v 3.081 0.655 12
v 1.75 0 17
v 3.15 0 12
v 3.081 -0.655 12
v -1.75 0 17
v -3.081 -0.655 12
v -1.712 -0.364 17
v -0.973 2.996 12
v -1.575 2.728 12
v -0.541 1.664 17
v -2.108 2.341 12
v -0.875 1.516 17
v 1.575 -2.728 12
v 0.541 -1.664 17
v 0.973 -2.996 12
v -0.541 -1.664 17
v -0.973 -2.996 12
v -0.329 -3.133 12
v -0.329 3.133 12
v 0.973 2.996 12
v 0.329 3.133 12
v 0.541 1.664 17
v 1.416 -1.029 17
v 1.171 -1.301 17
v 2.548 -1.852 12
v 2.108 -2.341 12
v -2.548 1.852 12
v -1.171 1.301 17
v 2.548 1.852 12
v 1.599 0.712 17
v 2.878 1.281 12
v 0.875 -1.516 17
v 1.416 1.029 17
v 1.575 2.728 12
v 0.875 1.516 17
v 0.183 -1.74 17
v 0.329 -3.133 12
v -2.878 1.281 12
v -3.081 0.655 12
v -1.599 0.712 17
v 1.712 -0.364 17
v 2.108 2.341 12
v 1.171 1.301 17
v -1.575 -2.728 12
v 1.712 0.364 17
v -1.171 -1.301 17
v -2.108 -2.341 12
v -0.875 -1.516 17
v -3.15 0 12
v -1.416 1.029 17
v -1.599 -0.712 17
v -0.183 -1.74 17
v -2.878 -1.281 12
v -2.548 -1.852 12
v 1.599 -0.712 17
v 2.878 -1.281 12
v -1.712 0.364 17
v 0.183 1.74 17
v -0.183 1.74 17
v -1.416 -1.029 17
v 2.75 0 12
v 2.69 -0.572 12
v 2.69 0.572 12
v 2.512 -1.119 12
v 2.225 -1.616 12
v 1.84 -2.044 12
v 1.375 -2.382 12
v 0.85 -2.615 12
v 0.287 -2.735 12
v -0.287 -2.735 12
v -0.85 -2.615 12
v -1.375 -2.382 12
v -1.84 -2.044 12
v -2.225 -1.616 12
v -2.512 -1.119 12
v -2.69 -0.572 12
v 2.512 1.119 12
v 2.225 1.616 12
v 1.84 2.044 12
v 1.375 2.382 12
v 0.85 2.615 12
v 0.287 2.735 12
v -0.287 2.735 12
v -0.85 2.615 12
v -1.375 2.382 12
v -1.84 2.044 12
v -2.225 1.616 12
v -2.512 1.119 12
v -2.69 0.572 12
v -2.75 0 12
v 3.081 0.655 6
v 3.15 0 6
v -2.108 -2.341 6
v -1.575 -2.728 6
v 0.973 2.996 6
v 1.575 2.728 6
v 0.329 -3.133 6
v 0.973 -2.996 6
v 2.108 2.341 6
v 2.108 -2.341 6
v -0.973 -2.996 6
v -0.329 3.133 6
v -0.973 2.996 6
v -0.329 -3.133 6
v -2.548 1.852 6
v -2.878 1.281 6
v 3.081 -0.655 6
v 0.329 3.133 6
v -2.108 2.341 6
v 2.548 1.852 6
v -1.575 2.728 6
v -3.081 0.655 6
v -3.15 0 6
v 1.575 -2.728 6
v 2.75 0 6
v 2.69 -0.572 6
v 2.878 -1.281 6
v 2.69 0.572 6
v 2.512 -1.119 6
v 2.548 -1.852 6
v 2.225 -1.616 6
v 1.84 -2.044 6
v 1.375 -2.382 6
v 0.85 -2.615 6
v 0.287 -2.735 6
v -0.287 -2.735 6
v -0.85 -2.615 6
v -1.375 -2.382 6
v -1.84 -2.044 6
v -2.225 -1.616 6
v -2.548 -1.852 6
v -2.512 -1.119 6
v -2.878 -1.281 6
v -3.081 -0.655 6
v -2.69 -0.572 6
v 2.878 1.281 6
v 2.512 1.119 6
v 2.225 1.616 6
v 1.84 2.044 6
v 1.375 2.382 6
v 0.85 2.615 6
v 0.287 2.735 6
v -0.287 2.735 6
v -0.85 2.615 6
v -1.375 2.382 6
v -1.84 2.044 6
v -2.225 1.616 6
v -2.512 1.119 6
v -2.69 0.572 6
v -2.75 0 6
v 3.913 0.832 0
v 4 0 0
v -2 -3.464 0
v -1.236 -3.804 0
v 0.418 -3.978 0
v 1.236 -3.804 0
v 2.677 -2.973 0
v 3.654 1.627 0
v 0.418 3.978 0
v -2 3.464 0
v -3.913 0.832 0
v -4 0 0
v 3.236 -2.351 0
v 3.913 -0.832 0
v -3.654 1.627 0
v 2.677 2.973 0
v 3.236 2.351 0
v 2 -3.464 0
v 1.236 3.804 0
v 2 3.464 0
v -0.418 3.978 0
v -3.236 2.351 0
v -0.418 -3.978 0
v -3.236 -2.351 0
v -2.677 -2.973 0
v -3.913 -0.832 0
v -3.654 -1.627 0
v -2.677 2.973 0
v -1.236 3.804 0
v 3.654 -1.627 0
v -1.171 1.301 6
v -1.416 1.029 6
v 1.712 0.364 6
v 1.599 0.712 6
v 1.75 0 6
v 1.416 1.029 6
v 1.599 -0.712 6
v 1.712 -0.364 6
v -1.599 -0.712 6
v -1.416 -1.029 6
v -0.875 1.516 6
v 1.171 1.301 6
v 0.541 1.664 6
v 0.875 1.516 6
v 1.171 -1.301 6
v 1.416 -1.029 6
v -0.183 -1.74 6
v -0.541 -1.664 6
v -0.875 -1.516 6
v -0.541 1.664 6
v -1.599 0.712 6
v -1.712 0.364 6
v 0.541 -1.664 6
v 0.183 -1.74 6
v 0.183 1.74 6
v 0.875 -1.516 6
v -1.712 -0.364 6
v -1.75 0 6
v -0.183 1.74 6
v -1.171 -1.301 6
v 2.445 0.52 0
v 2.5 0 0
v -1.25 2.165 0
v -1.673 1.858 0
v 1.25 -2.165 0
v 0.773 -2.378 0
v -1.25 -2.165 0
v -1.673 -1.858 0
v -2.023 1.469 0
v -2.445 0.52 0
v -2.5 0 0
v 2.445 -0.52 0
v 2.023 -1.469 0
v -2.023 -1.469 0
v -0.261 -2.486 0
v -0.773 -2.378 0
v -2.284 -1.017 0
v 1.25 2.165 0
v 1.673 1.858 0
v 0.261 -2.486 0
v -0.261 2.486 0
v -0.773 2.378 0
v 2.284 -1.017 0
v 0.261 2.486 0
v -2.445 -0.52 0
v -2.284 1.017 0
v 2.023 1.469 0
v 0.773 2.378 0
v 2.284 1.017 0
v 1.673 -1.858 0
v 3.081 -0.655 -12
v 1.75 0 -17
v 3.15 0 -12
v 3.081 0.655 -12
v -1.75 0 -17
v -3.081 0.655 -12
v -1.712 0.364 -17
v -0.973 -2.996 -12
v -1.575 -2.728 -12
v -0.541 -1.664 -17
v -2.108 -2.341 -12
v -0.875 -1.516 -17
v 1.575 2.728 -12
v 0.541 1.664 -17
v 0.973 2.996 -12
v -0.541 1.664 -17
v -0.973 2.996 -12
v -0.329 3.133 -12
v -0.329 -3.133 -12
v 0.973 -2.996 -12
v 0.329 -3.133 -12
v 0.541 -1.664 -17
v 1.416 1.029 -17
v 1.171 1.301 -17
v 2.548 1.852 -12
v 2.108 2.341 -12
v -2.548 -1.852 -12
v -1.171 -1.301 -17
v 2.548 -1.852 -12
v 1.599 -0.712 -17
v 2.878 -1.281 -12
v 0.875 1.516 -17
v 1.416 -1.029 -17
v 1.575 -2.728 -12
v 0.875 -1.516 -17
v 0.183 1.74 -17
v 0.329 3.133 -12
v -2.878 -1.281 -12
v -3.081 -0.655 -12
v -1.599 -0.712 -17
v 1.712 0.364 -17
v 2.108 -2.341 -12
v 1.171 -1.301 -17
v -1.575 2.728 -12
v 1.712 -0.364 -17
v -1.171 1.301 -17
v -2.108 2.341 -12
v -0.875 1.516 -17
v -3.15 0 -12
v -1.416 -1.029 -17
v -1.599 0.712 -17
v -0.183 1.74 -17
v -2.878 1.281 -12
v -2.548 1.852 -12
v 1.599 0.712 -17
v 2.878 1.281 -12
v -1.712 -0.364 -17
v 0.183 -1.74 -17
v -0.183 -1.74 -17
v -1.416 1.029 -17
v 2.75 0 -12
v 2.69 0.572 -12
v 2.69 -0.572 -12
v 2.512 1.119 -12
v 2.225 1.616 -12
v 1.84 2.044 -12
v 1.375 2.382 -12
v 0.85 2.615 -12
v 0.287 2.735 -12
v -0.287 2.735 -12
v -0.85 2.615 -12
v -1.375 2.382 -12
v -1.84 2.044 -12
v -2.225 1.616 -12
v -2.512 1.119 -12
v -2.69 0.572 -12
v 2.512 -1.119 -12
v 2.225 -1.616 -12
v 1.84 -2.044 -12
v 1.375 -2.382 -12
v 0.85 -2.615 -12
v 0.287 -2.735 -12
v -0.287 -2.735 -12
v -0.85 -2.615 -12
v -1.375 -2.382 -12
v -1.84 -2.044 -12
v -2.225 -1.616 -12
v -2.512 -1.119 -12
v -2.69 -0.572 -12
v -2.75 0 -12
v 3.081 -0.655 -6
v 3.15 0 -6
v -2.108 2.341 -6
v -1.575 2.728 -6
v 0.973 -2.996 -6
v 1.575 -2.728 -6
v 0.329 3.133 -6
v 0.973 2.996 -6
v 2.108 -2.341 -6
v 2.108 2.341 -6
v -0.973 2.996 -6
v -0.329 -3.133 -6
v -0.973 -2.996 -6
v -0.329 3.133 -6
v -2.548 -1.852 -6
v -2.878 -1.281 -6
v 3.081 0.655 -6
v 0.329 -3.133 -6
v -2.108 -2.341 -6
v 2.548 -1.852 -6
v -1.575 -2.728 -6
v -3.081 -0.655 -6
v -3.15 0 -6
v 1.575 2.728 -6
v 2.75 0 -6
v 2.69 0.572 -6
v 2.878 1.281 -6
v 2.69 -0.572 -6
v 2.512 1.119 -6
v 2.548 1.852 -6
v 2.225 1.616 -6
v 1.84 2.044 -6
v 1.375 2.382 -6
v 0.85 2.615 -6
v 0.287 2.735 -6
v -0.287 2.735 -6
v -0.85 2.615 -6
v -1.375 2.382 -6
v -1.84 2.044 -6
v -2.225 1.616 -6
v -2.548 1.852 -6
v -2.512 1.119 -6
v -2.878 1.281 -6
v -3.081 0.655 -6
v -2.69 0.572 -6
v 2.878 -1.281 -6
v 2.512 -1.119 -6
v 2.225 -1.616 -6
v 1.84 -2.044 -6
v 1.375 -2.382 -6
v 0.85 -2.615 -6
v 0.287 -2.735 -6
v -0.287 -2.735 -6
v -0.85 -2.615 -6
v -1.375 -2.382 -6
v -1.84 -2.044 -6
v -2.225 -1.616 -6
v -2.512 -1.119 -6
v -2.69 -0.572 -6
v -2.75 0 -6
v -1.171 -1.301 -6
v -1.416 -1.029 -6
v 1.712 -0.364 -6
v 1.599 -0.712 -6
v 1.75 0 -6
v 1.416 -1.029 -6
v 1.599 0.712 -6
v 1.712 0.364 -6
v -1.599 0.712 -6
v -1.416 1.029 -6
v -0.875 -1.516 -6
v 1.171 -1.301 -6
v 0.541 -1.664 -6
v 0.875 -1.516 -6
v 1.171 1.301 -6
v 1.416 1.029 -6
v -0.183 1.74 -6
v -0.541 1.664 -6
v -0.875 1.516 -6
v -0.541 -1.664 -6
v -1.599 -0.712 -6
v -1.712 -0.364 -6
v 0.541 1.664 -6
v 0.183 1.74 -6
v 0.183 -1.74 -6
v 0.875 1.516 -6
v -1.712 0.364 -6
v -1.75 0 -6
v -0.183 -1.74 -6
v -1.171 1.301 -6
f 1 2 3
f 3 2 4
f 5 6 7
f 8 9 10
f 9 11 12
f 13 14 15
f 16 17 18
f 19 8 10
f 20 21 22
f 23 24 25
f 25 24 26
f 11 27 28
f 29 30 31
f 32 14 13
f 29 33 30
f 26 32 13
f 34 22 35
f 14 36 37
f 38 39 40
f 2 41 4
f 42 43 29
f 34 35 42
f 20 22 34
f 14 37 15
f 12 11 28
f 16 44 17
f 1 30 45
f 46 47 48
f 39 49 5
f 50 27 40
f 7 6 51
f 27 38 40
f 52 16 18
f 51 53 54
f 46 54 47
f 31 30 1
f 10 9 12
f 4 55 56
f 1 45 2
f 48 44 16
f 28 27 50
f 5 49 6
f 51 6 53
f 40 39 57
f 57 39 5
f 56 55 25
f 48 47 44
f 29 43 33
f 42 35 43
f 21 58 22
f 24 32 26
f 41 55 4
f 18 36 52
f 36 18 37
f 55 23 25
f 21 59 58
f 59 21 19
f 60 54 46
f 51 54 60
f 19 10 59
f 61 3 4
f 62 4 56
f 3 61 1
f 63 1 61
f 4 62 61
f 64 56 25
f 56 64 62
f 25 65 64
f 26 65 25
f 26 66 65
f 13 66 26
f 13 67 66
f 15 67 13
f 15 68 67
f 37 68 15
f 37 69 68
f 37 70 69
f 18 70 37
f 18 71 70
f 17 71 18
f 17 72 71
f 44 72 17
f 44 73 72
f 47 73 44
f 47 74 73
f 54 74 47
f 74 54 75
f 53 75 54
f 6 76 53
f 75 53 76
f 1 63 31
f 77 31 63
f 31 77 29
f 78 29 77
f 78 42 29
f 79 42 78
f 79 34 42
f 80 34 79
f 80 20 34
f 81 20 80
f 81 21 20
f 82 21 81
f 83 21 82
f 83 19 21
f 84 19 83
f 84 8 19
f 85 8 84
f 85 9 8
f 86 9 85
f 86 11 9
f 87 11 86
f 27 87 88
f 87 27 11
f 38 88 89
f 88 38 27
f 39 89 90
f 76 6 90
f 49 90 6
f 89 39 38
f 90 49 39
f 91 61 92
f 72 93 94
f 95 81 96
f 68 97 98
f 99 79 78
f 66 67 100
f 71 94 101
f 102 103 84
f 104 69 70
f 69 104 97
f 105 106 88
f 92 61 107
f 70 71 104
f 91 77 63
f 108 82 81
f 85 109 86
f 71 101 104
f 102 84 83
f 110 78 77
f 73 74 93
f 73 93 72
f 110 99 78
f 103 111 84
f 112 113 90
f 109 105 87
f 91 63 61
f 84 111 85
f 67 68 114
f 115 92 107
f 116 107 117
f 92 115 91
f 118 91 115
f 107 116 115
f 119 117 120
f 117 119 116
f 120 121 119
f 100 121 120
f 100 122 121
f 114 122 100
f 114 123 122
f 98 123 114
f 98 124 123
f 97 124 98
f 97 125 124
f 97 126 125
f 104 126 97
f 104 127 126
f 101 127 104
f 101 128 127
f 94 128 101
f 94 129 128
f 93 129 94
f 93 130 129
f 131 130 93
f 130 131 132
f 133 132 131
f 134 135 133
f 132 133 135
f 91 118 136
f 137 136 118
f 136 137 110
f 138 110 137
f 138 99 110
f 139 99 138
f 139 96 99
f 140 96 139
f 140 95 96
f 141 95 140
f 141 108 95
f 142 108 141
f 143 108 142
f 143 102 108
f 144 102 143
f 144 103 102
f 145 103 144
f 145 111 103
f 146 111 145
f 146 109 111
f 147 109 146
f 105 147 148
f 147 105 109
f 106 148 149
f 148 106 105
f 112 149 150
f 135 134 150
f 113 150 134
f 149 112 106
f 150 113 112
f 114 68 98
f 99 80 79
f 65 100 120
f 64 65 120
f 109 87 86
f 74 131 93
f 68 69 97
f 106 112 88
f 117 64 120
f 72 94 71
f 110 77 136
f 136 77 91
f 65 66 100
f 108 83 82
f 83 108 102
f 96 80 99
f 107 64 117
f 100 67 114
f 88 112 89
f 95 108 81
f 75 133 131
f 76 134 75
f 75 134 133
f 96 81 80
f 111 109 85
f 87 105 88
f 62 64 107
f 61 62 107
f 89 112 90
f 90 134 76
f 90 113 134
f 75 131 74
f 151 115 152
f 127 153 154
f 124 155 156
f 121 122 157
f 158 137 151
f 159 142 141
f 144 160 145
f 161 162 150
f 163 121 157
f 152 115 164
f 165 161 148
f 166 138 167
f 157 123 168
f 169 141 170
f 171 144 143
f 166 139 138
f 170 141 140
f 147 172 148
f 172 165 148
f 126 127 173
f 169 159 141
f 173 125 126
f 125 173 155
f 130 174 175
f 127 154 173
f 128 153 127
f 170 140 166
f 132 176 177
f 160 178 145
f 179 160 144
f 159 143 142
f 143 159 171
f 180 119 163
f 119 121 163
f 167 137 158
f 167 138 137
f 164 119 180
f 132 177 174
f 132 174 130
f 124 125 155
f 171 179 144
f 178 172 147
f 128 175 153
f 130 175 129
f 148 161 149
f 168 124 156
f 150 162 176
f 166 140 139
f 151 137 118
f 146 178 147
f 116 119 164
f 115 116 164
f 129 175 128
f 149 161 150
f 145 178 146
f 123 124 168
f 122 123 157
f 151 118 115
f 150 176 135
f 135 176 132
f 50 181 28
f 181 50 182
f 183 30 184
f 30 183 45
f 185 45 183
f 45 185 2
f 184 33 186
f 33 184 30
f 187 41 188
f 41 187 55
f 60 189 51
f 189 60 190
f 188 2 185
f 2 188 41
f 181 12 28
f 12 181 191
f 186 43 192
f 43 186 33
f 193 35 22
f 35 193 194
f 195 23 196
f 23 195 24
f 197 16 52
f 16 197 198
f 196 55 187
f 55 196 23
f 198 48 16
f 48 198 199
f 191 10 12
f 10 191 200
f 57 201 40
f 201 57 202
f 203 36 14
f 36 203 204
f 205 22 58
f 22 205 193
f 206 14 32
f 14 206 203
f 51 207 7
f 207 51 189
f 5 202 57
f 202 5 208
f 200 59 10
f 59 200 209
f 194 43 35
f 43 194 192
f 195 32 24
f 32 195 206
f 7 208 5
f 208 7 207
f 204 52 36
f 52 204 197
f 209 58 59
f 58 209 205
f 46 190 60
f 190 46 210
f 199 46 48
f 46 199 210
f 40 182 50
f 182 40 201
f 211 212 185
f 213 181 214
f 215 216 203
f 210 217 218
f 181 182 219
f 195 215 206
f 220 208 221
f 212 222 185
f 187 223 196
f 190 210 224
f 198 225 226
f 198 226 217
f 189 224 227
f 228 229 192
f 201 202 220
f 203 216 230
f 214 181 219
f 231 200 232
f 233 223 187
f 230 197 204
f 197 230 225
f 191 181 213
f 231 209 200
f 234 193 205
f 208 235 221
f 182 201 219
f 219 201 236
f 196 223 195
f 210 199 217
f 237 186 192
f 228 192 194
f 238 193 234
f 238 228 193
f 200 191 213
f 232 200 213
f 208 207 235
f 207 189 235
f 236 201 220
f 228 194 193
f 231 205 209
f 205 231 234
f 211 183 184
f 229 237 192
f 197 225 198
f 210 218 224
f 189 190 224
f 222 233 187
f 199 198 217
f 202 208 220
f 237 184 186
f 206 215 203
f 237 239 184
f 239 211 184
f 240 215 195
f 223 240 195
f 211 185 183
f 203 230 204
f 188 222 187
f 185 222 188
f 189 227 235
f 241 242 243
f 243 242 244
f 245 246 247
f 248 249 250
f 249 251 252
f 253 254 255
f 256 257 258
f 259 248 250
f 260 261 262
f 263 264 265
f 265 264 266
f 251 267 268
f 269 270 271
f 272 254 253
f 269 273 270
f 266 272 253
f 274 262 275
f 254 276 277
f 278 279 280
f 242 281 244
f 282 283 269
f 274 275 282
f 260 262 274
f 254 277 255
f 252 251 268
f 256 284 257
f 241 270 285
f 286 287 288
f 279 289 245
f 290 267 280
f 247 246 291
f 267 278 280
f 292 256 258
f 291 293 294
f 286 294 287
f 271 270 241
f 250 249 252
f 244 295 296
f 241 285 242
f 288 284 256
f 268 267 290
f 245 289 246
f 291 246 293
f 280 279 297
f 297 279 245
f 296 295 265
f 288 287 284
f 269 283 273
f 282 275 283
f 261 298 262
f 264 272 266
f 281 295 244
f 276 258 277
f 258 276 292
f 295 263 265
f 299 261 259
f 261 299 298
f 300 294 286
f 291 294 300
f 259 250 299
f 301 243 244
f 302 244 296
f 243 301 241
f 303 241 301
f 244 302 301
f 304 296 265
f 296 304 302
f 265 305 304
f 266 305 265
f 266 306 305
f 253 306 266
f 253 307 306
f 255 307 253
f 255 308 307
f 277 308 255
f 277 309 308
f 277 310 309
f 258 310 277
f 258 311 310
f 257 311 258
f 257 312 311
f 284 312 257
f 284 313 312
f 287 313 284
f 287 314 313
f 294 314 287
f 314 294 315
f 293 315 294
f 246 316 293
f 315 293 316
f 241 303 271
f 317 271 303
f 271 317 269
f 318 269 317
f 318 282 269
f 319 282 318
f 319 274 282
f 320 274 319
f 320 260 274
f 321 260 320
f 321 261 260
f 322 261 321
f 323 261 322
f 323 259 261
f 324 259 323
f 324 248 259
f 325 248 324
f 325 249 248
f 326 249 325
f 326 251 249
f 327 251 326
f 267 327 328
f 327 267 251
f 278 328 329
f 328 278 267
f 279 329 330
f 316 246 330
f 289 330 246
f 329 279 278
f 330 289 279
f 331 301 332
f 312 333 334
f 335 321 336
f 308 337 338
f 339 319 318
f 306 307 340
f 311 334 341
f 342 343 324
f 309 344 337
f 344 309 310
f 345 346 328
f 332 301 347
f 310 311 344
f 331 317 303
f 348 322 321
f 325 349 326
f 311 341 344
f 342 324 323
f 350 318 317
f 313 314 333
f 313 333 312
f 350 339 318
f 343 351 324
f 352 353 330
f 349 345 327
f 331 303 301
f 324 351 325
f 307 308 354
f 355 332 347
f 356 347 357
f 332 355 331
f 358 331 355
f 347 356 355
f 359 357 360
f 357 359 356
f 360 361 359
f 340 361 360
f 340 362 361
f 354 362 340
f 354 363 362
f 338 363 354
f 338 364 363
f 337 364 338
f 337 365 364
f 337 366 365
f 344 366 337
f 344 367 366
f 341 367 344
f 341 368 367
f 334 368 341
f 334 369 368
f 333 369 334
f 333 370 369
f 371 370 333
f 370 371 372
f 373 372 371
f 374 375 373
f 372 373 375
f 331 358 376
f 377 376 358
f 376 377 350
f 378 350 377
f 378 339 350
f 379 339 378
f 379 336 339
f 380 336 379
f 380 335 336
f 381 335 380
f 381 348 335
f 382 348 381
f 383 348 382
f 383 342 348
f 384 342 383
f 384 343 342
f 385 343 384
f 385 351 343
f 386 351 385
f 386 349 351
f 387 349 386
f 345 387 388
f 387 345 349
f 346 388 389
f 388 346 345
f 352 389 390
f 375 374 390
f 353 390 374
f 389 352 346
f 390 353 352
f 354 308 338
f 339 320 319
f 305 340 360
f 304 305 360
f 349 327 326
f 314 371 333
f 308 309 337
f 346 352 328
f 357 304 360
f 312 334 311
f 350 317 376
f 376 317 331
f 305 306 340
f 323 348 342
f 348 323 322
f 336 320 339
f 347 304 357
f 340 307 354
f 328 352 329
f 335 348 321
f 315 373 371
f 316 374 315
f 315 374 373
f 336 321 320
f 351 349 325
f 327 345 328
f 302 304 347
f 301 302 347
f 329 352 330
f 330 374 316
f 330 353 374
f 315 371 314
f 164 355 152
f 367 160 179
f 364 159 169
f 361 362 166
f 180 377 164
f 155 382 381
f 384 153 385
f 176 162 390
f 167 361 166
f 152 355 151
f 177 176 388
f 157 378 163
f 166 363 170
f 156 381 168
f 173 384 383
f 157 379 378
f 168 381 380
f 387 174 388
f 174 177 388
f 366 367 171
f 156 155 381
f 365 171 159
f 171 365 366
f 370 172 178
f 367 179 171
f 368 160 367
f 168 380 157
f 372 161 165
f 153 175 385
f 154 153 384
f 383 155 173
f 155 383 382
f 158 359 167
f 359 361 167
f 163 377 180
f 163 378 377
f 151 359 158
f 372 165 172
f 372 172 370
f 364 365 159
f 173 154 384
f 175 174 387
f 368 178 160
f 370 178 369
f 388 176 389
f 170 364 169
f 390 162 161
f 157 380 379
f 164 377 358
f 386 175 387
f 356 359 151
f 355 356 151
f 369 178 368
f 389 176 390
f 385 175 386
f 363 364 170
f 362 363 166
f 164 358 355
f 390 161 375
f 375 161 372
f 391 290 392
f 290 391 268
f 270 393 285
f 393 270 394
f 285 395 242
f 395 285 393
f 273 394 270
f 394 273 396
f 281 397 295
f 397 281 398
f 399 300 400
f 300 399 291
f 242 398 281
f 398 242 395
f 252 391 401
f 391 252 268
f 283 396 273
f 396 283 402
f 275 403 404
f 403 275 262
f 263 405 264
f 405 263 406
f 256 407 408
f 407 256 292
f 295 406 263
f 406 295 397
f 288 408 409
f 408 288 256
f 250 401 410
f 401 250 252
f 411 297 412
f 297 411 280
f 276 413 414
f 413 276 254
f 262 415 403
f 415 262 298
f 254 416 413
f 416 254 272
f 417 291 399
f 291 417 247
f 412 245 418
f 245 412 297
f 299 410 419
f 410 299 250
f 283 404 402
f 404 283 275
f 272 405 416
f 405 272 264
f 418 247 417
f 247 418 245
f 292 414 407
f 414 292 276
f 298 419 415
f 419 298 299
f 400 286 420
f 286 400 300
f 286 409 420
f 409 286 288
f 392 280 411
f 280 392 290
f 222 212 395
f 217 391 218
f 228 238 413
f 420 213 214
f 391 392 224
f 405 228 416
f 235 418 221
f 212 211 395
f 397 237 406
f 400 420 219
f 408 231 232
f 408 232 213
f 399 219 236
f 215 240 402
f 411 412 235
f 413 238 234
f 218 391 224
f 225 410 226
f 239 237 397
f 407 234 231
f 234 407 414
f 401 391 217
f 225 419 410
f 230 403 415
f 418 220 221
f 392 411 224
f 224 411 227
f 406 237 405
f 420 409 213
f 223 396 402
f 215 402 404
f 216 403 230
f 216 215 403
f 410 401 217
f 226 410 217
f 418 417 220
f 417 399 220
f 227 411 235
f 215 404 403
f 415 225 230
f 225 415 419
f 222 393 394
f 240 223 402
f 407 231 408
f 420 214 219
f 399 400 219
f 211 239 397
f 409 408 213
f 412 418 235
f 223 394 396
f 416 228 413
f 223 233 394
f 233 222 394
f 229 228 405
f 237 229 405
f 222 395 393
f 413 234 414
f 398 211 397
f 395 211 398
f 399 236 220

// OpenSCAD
pcInnDia=3.5;
pcInnDiaEnd=5;
pcOutSmallDia=pcInnDia+2;
pcOutBigDia=pcOutSmallDia+0.8;
pcOutEndDia=8;
pcTipH=5;
pcNotchH=6;
pcNotchCnt=1;
pcEndH=pcNotchH;


pcFn=30;
pcH=pcTipH+pcNotchH*pcNotchCnt+pcEndH;

module PipeConnector() difference(){
	union(){
		translate([0,0,pcNotchH*pcNotchCnt+pcEndH])
		cylinder(d2=pcInnDia,d1=pcOutBigDia,h=pcTipH,$fn=pcFn);
		for(i=[0:(pcNotchCnt-1)])
		translate([0,0,pcNotchH*i+pcEndH])
		cylinder(d2=pcOutSmallDia,d1=pcOutBigDia,h=pcNotchH,$fn=pcFn);
		cylinder(d2=pcOutSmallDia,d1=pcOutEndDia,h=pcEndH,$fn=pcFn);
	}
	cylinder(d=pcInnDia,h=pcH,$fn=pcFn);
	cylinder(d2=pcInnDia,d1=pcInnDiaEnd,h=pcEndH,$fn=pcFn);
}

PipeConnector();
rotate([180,0,0])
PipeConnector();
